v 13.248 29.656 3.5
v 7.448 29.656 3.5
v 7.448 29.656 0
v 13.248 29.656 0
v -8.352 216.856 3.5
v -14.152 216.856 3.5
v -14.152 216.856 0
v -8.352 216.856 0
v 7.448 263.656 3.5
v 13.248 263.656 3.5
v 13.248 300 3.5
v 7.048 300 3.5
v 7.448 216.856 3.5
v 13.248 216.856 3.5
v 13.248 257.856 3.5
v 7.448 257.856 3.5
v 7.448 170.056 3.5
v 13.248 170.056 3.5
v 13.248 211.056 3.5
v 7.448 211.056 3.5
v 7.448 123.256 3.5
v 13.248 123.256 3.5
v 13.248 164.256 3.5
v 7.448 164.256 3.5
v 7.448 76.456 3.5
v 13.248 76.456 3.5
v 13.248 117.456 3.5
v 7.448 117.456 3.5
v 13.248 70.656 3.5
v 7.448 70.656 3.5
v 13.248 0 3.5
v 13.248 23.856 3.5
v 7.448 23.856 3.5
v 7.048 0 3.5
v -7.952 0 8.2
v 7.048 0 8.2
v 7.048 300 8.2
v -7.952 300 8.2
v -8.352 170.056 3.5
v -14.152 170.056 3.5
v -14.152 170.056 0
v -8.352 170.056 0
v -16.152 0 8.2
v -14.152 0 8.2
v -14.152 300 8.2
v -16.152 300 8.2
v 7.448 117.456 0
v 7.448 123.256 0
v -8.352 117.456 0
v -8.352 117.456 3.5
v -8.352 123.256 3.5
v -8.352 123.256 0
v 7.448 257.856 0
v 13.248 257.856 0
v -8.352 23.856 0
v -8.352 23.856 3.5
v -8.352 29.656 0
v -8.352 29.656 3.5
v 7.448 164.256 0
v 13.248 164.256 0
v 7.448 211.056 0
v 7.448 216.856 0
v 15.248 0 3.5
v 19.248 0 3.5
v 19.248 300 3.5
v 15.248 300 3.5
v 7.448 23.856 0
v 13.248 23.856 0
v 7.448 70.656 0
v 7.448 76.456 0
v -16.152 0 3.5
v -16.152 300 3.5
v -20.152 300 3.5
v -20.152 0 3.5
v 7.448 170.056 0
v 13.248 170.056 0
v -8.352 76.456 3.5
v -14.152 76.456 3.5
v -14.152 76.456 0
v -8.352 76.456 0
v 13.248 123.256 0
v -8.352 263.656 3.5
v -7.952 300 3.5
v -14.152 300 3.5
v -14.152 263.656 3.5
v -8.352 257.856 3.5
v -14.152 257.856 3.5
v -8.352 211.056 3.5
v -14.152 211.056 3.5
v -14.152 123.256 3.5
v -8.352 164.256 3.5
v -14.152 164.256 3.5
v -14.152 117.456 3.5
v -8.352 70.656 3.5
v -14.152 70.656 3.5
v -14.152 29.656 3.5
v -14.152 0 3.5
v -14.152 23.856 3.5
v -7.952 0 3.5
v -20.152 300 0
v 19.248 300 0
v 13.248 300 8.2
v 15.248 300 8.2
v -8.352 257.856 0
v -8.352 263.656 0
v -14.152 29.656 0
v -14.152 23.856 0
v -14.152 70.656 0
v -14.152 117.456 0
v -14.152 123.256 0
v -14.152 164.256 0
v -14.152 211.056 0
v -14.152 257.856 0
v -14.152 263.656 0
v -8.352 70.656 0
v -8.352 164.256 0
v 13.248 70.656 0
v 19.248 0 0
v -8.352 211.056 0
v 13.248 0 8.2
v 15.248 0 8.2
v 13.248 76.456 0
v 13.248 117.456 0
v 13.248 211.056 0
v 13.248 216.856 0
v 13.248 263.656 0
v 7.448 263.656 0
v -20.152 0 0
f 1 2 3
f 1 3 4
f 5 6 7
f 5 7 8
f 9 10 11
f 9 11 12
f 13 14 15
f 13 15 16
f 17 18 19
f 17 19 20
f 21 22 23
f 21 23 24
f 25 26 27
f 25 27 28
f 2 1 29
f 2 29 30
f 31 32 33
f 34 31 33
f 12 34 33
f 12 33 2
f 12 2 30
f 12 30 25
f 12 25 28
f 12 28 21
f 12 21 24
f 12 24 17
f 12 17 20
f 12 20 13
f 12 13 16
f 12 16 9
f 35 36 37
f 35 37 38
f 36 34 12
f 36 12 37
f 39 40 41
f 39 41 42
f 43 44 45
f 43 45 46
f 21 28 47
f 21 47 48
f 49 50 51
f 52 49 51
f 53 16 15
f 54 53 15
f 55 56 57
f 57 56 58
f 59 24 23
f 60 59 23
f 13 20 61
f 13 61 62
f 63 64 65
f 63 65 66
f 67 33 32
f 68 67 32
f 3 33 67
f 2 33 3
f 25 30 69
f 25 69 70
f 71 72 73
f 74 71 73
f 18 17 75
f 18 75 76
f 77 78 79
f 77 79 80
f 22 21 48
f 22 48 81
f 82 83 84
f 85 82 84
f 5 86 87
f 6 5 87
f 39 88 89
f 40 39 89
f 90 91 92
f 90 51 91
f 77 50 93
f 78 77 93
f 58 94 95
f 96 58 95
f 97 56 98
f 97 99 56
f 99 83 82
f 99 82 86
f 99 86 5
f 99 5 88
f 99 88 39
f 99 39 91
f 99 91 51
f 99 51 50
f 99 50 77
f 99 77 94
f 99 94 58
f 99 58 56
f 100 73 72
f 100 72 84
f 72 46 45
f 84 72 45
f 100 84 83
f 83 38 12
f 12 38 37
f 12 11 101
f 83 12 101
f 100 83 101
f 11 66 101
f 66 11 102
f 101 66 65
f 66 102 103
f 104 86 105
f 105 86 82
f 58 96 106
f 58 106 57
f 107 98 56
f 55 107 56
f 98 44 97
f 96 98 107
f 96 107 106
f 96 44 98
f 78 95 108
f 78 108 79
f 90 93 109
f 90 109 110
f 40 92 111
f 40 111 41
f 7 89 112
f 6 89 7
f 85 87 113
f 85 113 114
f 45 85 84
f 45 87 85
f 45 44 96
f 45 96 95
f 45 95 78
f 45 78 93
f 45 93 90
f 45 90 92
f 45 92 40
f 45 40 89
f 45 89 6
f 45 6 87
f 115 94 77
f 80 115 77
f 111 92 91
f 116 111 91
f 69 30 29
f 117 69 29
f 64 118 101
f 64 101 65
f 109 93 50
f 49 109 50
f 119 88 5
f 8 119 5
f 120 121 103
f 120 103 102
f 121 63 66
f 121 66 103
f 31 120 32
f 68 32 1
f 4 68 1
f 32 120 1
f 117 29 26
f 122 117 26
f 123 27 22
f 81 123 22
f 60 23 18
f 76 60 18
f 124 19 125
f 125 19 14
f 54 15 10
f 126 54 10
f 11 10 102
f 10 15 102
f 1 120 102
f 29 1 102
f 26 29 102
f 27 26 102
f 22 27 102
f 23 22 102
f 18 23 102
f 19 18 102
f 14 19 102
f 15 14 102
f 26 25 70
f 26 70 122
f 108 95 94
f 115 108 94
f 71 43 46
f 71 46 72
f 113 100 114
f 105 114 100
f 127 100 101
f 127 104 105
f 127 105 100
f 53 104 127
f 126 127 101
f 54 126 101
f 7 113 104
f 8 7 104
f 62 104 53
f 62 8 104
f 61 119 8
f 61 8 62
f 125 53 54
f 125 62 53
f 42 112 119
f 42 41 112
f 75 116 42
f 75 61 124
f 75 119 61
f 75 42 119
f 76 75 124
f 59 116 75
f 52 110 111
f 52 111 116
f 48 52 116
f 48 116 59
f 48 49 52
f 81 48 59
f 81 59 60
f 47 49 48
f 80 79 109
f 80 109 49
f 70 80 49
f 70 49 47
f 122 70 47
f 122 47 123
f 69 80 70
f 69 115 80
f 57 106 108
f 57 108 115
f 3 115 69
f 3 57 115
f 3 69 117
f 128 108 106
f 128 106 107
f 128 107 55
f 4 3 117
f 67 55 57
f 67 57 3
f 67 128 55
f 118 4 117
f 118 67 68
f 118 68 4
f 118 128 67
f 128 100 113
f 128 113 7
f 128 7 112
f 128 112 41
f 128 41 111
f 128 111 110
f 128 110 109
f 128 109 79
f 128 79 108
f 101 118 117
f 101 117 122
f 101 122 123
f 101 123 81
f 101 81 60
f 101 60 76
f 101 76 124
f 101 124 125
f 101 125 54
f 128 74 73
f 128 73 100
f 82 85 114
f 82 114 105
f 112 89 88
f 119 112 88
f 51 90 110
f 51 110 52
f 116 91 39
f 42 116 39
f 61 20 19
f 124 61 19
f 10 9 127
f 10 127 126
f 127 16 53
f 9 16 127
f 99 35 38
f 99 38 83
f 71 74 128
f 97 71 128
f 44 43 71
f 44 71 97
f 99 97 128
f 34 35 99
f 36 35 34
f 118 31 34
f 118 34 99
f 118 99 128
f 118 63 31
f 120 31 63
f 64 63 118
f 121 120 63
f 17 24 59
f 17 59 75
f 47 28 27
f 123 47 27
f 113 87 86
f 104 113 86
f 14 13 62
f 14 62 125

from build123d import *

# Parameters (mm, degrees)
F1_DEPTH = 300
F2_W     = 5.8
F2_H     = 5.8
F3_DEPTH = 3.501


with BuildPart() as f1:
    # F0 (on Front) → F1 (new body)
    with BuildSketch(Plane.XZ):
        Polygon((-20.152273, 3.5), (-20.152273, 0), (19.247727, 0), (19.247727, 3.5), (15.247727, 3.5), (15.247727, 8.2), (13.247727, 8.2), (13.247727, 3.5), (7.047727, 3.5), (7.047727, 8.2), (-7.952273, 8.2), (-7.952273, 3.5), (-14.152273, 3.5), (-14.152273, 8.2), (-16.152273, 8.2), (-16.152273, 3.5), align=None)
    extrude(amount=-F1_DEPTH)

    # F2 (on face) → F3 (cut, through all)
    with BuildSketch(Plane.XY.offset(3.5)):
        with Locations((-11.252273, 26.756441)):
            Rectangle(F2_W, F2_H)
        with Locations((-11.252273, 73.556441)):
            Rectangle(F2_W, F2_H)
        with Locations((-11.252273, 120.356441)):
            Rectangle(F2_W, F2_H)
        with Locations((-11.252273, 167.156441)):
            Rectangle(F2_W, F2_H)
        with Locations((-11.252273, 213.956441)):
            Rectangle(F2_W, F2_H)
        with Locations((-11.252273, 260.756441)):
            Rectangle(F2_W, F2_H)
        with Locations((-11.252273, 307.556441)):
            Rectangle(F2_W, F2_H)
        with Locations((-11.252273, 354.356441)):
            Rectangle(F2_W, F2_H)
        with Locations((-11.252273, 401.156441)):
            Rectangle(F2_W, F2_H)
        with Locations((-11.252273, 447.956441)):
            Rectangle(F2_W, F2_H)
        with Locations((-11.252273, 494.756441)):
            Rectangle(F2_W, F2_H)
        with Locations((-11.252273, 541.556441)):
            Rectangle(F2_W, F2_H)
        with Locations((-11.252273, 588.356441)):
            Rectangle(F2_W, F2_H)
        with Locations((-11.252273, 635.156441)):
            Rectangle(F2_W, F2_H)
        with Locations((-11.252273, 681.956441)):
            Rectangle(F2_W, F2_H)
        with Locations((-11.252273, 728.756441)):
            Rectangle(F2_W, F2_H)
        with Locations((-11.252273, 775.556441)):
            Rectangle(F2_W, F2_H)
        with Locations((-11.252273, 822.356441)):
            Rectangle(F2_W, F2_H)
        with Locations((-11.252273, 869.156441)):
            Rectangle(F2_W, F2_H)
        with Locations((-11.252273, 915.956441)):
            Rectangle(F2_W, F2_H)
        with Locations((-11.252273, 962.756441)):
            Rectangle(F2_W, F2_H)
        with Locations((-11.252273, 1009.556441)):
            Rectangle(F2_W, F2_H)
        with Locations((-11.252273, 1056.356441)):
            Rectangle(F2_W, F2_H)
        with Locations((-11.252273, 1103.156441)):
            Rectangle(F2_W, F2_H)
        with Locations((-11.252273, 1149.956441)):
            Rectangle(F2_W, F2_H)
        with Locations((-11.252273, 1196.756441)):
            Rectangle(F2_W, F2_H)
        with Locations((-11.252273, 1243.556441)):
            Rectangle(F2_W, F2_H)
        with Locations((-11.252273, 1290.356441)):
            Rectangle(F2_W, F2_H)
        with Locations((-11.252273, 1337.156441)):
            Rectangle(F2_W, F2_H)
        with Locations((-11.252273, 1383.956441)):
            Rectangle(F2_W, F2_H)
        with Locations((10.347727, 26.756441)):
            Rectangle(F2_W, F2_H)
        with Locations((10.347727, 73.556441)):
            Rectangle(F2_W, F2_H)
        with Locations((10.347727, 120.356441)):
            Rectangle(F2_W, F2_H)
        with Locations((10.347727, 167.156441)):
            Rectangle(F2_W, F2_H)
        with Locations((10.347727, 213.956441)):
            Rectangle(F2_W, F2_H)
        with Locations((10.347727, 260.756441)):
            Rectangle(F2_W, F2_H)
        with Locations((10.347727, 307.556441)):
            Rectangle(F2_W, F2_H)
        with Locations((10.347727, 354.356441)):
            Rectangle(F2_W, F2_H)
        with Locations((10.347727, 401.156441)):
            Rectangle(F2_W, F2_H)
        with Locations((10.347727, 447.956441)):
            Rectangle(F2_W, F2_H)
        with Locations((10.347727, 494.756441)):
            Rectangle(F2_W, F2_H)
        with Locations((10.347727, 541.556441)):
            Rectangle(F2_W, F2_H)
        with Locations((10.347727, 588.356441)):
            Rectangle(F2_W, F2_H)
        with Locations((10.347727, 635.156441)):
            Rectangle(F2_W, F2_H)
        with Locations((10.347727, 681.956441)):
            Rectangle(F2_W, F2_H)
        with Locations((10.347727, 728.756441)):
            Rectangle(F2_W, F2_H)
        with Locations((10.347727, 775.556441)):
            Rectangle(F2_W, F2_H)
        with Locations((10.347727, 822.356441)):
            Rectangle(F2_W, F2_H)
        with Locations((10.347727, 869.156441)):
            Rectangle(F2_W, F2_H)
        with Locations((10.347727, 915.956441)):
            Rectangle(F2_W, F2_H)
        with Locations((10.347727, 962.756441)):
            Rectangle(F2_W, F2_H)
        with Locations((10.347727, 1009.556441)):
            Rectangle(F2_W, F2_H)
        with Locations((10.347727, 1056.356441)):
            Rectangle(F2_W, F2_H)
        with Locations((10.347727, 1103.156441)):
            Rectangle(F2_W, F2_H)
        with Locations((10.347727, 1149.956441)):
            Rectangle(F2_W, F2_H)
        with Locations((10.347727, 1196.756441)):
            Rectangle(F2_W, F2_H)
        with Locations((10.347727, 1243.556441)):
            Rectangle(F2_W, F2_H)
        with Locations((10.347727, 1290.356441)):
            Rectangle(F2_W, F2_H)
        with Locations((10.347727, 1337.156441)):
            Rectangle(F2_W, F2_H)
        with Locations((10.347727, 1383.956441)):
            Rectangle(F2_W, F2_H)
        with Locations((-11.252273, 1430.756441)):
            Rectangle(F2_W, F2_H)
        with Locations((-11.252273, 1477.556441)):
            Rectangle(F2_W, F2_H)
        with Locations((-11.252273, 1524.356441)):
            Rectangle(F2_W, F2_H)
        with Locations((-11.252273, 1571.156441)):
            Rectangle(F2_W, F2_H)
        with Locations((-11.252273, 1617.956441)):
            Rectangle(F2_W, F2_H)
        with Locations((-11.252273, 1664.756441)):
            Rectangle(F2_W, F2_H)
        with Locations((-11.252273, 1711.556441)):
            Rectangle(F2_W, F2_H)
        with Locations((-11.252273, 1758.356441)):
            Rectangle(F2_W, F2_H)
        with Locations((-11.252273, 1805.156441)):
            Rectangle(F2_W, F2_H)
        with Locations((-11.252273, 1851.956441)):
            Rectangle(F2_W, F2_H)
        with Locations((-11.252273, 1898.756441)):
            Rectangle(F2_W, F2_H)
        with Locations((-11.252273, 1945.556441)):
            Rectangle(F2_W, F2_H)
        with Locations((-11.252273, 1992.356441)):
            Rectangle(F2_W, F2_H)
        with Locations((-11.252273, 2039.156441)):
            Rectangle(F2_W, F2_H)
        with Locations((-11.252273, 2085.956441)):
            Rectangle(F2_W, F2_H)
        with Locations((-11.252273, 2132.756441)):
            Rectangle(F2_W, F2_H)
        with Locations((-11.252273, 2179.556441)):
            Rectangle(F2_W, F2_H)
        with Locations((-11.252273, 2226.356441)):
            Rectangle(F2_W, F2_H)
        with Locations((-11.252273, 2273.156441)):
            Rectangle(F2_W, F2_H)
        with Locations((-11.252273, 2319.956441)):
            Rectangle(F2_W, F2_H)
        with Locations((10.347727, 1430.756441)):
            Rectangle(F2_W, F2_H)
        with Locations((10.347727, 1477.556441)):
            Rectangle(F2_W, F2_H)
        with Locations((10.347727, 1524.356441)):
            Rectangle(F2_W, F2_H)
        with Locations((10.347727, 1571.156441)):
            Rectangle(F2_W, F2_H)
        with Locations((10.347727, 1617.956441)):
            Rectangle(F2_W, F2_H)
        with Locations((10.347727, 1664.756441)):
            Rectangle(F2_W, F2_H)
        with Locations((10.347727, 1711.556441)):
            Rectangle(F2_W, F2_H)
        with Locations((10.347727, 1758.356441)):
            Rectangle(F2_W, F2_H)
        with Locations((10.347727, 1805.156441)):
            Rectangle(F2_W, F2_H)
        with Locations((10.347727, 1851.956441)):
            Rectangle(F2_W, F2_H)
        with Locations((10.347727, 1898.756441)):
            Rectangle(F2_W, F2_H)
        with Locations((10.347727, 1945.556441)):
            Rectangle(F2_W, F2_H)
        with Locations((10.347727, 1992.356441)):
            Rectangle(F2_W, F2_H)
        with Locations((10.347727, 2039.156441)):
            Rectangle(F2_W, F2_H)
        with Locations((10.347727, 2085.956441)):
            Rectangle(F2_W, F2_H)
        with Locations((10.347727, 2132.756441)):
            Rectangle(F2_W, F2_H)
        with Locations((10.347727, 2179.556441)):
            Rectangle(F2_W, F2_H)
        with Locations((10.347727, 2226.356441)):
            Rectangle(F2_W, F2_H)
        with Locations((10.347727, 2273.156441)):
            Rectangle(F2_W, F2_H)
        with Locations((10.347727, 2319.956441)):
            Rectangle(F2_W, F2_H)
    extrude(amount=-F3_DEPTH, mode=Mode.SUBTRACT)


solid = f1.part
